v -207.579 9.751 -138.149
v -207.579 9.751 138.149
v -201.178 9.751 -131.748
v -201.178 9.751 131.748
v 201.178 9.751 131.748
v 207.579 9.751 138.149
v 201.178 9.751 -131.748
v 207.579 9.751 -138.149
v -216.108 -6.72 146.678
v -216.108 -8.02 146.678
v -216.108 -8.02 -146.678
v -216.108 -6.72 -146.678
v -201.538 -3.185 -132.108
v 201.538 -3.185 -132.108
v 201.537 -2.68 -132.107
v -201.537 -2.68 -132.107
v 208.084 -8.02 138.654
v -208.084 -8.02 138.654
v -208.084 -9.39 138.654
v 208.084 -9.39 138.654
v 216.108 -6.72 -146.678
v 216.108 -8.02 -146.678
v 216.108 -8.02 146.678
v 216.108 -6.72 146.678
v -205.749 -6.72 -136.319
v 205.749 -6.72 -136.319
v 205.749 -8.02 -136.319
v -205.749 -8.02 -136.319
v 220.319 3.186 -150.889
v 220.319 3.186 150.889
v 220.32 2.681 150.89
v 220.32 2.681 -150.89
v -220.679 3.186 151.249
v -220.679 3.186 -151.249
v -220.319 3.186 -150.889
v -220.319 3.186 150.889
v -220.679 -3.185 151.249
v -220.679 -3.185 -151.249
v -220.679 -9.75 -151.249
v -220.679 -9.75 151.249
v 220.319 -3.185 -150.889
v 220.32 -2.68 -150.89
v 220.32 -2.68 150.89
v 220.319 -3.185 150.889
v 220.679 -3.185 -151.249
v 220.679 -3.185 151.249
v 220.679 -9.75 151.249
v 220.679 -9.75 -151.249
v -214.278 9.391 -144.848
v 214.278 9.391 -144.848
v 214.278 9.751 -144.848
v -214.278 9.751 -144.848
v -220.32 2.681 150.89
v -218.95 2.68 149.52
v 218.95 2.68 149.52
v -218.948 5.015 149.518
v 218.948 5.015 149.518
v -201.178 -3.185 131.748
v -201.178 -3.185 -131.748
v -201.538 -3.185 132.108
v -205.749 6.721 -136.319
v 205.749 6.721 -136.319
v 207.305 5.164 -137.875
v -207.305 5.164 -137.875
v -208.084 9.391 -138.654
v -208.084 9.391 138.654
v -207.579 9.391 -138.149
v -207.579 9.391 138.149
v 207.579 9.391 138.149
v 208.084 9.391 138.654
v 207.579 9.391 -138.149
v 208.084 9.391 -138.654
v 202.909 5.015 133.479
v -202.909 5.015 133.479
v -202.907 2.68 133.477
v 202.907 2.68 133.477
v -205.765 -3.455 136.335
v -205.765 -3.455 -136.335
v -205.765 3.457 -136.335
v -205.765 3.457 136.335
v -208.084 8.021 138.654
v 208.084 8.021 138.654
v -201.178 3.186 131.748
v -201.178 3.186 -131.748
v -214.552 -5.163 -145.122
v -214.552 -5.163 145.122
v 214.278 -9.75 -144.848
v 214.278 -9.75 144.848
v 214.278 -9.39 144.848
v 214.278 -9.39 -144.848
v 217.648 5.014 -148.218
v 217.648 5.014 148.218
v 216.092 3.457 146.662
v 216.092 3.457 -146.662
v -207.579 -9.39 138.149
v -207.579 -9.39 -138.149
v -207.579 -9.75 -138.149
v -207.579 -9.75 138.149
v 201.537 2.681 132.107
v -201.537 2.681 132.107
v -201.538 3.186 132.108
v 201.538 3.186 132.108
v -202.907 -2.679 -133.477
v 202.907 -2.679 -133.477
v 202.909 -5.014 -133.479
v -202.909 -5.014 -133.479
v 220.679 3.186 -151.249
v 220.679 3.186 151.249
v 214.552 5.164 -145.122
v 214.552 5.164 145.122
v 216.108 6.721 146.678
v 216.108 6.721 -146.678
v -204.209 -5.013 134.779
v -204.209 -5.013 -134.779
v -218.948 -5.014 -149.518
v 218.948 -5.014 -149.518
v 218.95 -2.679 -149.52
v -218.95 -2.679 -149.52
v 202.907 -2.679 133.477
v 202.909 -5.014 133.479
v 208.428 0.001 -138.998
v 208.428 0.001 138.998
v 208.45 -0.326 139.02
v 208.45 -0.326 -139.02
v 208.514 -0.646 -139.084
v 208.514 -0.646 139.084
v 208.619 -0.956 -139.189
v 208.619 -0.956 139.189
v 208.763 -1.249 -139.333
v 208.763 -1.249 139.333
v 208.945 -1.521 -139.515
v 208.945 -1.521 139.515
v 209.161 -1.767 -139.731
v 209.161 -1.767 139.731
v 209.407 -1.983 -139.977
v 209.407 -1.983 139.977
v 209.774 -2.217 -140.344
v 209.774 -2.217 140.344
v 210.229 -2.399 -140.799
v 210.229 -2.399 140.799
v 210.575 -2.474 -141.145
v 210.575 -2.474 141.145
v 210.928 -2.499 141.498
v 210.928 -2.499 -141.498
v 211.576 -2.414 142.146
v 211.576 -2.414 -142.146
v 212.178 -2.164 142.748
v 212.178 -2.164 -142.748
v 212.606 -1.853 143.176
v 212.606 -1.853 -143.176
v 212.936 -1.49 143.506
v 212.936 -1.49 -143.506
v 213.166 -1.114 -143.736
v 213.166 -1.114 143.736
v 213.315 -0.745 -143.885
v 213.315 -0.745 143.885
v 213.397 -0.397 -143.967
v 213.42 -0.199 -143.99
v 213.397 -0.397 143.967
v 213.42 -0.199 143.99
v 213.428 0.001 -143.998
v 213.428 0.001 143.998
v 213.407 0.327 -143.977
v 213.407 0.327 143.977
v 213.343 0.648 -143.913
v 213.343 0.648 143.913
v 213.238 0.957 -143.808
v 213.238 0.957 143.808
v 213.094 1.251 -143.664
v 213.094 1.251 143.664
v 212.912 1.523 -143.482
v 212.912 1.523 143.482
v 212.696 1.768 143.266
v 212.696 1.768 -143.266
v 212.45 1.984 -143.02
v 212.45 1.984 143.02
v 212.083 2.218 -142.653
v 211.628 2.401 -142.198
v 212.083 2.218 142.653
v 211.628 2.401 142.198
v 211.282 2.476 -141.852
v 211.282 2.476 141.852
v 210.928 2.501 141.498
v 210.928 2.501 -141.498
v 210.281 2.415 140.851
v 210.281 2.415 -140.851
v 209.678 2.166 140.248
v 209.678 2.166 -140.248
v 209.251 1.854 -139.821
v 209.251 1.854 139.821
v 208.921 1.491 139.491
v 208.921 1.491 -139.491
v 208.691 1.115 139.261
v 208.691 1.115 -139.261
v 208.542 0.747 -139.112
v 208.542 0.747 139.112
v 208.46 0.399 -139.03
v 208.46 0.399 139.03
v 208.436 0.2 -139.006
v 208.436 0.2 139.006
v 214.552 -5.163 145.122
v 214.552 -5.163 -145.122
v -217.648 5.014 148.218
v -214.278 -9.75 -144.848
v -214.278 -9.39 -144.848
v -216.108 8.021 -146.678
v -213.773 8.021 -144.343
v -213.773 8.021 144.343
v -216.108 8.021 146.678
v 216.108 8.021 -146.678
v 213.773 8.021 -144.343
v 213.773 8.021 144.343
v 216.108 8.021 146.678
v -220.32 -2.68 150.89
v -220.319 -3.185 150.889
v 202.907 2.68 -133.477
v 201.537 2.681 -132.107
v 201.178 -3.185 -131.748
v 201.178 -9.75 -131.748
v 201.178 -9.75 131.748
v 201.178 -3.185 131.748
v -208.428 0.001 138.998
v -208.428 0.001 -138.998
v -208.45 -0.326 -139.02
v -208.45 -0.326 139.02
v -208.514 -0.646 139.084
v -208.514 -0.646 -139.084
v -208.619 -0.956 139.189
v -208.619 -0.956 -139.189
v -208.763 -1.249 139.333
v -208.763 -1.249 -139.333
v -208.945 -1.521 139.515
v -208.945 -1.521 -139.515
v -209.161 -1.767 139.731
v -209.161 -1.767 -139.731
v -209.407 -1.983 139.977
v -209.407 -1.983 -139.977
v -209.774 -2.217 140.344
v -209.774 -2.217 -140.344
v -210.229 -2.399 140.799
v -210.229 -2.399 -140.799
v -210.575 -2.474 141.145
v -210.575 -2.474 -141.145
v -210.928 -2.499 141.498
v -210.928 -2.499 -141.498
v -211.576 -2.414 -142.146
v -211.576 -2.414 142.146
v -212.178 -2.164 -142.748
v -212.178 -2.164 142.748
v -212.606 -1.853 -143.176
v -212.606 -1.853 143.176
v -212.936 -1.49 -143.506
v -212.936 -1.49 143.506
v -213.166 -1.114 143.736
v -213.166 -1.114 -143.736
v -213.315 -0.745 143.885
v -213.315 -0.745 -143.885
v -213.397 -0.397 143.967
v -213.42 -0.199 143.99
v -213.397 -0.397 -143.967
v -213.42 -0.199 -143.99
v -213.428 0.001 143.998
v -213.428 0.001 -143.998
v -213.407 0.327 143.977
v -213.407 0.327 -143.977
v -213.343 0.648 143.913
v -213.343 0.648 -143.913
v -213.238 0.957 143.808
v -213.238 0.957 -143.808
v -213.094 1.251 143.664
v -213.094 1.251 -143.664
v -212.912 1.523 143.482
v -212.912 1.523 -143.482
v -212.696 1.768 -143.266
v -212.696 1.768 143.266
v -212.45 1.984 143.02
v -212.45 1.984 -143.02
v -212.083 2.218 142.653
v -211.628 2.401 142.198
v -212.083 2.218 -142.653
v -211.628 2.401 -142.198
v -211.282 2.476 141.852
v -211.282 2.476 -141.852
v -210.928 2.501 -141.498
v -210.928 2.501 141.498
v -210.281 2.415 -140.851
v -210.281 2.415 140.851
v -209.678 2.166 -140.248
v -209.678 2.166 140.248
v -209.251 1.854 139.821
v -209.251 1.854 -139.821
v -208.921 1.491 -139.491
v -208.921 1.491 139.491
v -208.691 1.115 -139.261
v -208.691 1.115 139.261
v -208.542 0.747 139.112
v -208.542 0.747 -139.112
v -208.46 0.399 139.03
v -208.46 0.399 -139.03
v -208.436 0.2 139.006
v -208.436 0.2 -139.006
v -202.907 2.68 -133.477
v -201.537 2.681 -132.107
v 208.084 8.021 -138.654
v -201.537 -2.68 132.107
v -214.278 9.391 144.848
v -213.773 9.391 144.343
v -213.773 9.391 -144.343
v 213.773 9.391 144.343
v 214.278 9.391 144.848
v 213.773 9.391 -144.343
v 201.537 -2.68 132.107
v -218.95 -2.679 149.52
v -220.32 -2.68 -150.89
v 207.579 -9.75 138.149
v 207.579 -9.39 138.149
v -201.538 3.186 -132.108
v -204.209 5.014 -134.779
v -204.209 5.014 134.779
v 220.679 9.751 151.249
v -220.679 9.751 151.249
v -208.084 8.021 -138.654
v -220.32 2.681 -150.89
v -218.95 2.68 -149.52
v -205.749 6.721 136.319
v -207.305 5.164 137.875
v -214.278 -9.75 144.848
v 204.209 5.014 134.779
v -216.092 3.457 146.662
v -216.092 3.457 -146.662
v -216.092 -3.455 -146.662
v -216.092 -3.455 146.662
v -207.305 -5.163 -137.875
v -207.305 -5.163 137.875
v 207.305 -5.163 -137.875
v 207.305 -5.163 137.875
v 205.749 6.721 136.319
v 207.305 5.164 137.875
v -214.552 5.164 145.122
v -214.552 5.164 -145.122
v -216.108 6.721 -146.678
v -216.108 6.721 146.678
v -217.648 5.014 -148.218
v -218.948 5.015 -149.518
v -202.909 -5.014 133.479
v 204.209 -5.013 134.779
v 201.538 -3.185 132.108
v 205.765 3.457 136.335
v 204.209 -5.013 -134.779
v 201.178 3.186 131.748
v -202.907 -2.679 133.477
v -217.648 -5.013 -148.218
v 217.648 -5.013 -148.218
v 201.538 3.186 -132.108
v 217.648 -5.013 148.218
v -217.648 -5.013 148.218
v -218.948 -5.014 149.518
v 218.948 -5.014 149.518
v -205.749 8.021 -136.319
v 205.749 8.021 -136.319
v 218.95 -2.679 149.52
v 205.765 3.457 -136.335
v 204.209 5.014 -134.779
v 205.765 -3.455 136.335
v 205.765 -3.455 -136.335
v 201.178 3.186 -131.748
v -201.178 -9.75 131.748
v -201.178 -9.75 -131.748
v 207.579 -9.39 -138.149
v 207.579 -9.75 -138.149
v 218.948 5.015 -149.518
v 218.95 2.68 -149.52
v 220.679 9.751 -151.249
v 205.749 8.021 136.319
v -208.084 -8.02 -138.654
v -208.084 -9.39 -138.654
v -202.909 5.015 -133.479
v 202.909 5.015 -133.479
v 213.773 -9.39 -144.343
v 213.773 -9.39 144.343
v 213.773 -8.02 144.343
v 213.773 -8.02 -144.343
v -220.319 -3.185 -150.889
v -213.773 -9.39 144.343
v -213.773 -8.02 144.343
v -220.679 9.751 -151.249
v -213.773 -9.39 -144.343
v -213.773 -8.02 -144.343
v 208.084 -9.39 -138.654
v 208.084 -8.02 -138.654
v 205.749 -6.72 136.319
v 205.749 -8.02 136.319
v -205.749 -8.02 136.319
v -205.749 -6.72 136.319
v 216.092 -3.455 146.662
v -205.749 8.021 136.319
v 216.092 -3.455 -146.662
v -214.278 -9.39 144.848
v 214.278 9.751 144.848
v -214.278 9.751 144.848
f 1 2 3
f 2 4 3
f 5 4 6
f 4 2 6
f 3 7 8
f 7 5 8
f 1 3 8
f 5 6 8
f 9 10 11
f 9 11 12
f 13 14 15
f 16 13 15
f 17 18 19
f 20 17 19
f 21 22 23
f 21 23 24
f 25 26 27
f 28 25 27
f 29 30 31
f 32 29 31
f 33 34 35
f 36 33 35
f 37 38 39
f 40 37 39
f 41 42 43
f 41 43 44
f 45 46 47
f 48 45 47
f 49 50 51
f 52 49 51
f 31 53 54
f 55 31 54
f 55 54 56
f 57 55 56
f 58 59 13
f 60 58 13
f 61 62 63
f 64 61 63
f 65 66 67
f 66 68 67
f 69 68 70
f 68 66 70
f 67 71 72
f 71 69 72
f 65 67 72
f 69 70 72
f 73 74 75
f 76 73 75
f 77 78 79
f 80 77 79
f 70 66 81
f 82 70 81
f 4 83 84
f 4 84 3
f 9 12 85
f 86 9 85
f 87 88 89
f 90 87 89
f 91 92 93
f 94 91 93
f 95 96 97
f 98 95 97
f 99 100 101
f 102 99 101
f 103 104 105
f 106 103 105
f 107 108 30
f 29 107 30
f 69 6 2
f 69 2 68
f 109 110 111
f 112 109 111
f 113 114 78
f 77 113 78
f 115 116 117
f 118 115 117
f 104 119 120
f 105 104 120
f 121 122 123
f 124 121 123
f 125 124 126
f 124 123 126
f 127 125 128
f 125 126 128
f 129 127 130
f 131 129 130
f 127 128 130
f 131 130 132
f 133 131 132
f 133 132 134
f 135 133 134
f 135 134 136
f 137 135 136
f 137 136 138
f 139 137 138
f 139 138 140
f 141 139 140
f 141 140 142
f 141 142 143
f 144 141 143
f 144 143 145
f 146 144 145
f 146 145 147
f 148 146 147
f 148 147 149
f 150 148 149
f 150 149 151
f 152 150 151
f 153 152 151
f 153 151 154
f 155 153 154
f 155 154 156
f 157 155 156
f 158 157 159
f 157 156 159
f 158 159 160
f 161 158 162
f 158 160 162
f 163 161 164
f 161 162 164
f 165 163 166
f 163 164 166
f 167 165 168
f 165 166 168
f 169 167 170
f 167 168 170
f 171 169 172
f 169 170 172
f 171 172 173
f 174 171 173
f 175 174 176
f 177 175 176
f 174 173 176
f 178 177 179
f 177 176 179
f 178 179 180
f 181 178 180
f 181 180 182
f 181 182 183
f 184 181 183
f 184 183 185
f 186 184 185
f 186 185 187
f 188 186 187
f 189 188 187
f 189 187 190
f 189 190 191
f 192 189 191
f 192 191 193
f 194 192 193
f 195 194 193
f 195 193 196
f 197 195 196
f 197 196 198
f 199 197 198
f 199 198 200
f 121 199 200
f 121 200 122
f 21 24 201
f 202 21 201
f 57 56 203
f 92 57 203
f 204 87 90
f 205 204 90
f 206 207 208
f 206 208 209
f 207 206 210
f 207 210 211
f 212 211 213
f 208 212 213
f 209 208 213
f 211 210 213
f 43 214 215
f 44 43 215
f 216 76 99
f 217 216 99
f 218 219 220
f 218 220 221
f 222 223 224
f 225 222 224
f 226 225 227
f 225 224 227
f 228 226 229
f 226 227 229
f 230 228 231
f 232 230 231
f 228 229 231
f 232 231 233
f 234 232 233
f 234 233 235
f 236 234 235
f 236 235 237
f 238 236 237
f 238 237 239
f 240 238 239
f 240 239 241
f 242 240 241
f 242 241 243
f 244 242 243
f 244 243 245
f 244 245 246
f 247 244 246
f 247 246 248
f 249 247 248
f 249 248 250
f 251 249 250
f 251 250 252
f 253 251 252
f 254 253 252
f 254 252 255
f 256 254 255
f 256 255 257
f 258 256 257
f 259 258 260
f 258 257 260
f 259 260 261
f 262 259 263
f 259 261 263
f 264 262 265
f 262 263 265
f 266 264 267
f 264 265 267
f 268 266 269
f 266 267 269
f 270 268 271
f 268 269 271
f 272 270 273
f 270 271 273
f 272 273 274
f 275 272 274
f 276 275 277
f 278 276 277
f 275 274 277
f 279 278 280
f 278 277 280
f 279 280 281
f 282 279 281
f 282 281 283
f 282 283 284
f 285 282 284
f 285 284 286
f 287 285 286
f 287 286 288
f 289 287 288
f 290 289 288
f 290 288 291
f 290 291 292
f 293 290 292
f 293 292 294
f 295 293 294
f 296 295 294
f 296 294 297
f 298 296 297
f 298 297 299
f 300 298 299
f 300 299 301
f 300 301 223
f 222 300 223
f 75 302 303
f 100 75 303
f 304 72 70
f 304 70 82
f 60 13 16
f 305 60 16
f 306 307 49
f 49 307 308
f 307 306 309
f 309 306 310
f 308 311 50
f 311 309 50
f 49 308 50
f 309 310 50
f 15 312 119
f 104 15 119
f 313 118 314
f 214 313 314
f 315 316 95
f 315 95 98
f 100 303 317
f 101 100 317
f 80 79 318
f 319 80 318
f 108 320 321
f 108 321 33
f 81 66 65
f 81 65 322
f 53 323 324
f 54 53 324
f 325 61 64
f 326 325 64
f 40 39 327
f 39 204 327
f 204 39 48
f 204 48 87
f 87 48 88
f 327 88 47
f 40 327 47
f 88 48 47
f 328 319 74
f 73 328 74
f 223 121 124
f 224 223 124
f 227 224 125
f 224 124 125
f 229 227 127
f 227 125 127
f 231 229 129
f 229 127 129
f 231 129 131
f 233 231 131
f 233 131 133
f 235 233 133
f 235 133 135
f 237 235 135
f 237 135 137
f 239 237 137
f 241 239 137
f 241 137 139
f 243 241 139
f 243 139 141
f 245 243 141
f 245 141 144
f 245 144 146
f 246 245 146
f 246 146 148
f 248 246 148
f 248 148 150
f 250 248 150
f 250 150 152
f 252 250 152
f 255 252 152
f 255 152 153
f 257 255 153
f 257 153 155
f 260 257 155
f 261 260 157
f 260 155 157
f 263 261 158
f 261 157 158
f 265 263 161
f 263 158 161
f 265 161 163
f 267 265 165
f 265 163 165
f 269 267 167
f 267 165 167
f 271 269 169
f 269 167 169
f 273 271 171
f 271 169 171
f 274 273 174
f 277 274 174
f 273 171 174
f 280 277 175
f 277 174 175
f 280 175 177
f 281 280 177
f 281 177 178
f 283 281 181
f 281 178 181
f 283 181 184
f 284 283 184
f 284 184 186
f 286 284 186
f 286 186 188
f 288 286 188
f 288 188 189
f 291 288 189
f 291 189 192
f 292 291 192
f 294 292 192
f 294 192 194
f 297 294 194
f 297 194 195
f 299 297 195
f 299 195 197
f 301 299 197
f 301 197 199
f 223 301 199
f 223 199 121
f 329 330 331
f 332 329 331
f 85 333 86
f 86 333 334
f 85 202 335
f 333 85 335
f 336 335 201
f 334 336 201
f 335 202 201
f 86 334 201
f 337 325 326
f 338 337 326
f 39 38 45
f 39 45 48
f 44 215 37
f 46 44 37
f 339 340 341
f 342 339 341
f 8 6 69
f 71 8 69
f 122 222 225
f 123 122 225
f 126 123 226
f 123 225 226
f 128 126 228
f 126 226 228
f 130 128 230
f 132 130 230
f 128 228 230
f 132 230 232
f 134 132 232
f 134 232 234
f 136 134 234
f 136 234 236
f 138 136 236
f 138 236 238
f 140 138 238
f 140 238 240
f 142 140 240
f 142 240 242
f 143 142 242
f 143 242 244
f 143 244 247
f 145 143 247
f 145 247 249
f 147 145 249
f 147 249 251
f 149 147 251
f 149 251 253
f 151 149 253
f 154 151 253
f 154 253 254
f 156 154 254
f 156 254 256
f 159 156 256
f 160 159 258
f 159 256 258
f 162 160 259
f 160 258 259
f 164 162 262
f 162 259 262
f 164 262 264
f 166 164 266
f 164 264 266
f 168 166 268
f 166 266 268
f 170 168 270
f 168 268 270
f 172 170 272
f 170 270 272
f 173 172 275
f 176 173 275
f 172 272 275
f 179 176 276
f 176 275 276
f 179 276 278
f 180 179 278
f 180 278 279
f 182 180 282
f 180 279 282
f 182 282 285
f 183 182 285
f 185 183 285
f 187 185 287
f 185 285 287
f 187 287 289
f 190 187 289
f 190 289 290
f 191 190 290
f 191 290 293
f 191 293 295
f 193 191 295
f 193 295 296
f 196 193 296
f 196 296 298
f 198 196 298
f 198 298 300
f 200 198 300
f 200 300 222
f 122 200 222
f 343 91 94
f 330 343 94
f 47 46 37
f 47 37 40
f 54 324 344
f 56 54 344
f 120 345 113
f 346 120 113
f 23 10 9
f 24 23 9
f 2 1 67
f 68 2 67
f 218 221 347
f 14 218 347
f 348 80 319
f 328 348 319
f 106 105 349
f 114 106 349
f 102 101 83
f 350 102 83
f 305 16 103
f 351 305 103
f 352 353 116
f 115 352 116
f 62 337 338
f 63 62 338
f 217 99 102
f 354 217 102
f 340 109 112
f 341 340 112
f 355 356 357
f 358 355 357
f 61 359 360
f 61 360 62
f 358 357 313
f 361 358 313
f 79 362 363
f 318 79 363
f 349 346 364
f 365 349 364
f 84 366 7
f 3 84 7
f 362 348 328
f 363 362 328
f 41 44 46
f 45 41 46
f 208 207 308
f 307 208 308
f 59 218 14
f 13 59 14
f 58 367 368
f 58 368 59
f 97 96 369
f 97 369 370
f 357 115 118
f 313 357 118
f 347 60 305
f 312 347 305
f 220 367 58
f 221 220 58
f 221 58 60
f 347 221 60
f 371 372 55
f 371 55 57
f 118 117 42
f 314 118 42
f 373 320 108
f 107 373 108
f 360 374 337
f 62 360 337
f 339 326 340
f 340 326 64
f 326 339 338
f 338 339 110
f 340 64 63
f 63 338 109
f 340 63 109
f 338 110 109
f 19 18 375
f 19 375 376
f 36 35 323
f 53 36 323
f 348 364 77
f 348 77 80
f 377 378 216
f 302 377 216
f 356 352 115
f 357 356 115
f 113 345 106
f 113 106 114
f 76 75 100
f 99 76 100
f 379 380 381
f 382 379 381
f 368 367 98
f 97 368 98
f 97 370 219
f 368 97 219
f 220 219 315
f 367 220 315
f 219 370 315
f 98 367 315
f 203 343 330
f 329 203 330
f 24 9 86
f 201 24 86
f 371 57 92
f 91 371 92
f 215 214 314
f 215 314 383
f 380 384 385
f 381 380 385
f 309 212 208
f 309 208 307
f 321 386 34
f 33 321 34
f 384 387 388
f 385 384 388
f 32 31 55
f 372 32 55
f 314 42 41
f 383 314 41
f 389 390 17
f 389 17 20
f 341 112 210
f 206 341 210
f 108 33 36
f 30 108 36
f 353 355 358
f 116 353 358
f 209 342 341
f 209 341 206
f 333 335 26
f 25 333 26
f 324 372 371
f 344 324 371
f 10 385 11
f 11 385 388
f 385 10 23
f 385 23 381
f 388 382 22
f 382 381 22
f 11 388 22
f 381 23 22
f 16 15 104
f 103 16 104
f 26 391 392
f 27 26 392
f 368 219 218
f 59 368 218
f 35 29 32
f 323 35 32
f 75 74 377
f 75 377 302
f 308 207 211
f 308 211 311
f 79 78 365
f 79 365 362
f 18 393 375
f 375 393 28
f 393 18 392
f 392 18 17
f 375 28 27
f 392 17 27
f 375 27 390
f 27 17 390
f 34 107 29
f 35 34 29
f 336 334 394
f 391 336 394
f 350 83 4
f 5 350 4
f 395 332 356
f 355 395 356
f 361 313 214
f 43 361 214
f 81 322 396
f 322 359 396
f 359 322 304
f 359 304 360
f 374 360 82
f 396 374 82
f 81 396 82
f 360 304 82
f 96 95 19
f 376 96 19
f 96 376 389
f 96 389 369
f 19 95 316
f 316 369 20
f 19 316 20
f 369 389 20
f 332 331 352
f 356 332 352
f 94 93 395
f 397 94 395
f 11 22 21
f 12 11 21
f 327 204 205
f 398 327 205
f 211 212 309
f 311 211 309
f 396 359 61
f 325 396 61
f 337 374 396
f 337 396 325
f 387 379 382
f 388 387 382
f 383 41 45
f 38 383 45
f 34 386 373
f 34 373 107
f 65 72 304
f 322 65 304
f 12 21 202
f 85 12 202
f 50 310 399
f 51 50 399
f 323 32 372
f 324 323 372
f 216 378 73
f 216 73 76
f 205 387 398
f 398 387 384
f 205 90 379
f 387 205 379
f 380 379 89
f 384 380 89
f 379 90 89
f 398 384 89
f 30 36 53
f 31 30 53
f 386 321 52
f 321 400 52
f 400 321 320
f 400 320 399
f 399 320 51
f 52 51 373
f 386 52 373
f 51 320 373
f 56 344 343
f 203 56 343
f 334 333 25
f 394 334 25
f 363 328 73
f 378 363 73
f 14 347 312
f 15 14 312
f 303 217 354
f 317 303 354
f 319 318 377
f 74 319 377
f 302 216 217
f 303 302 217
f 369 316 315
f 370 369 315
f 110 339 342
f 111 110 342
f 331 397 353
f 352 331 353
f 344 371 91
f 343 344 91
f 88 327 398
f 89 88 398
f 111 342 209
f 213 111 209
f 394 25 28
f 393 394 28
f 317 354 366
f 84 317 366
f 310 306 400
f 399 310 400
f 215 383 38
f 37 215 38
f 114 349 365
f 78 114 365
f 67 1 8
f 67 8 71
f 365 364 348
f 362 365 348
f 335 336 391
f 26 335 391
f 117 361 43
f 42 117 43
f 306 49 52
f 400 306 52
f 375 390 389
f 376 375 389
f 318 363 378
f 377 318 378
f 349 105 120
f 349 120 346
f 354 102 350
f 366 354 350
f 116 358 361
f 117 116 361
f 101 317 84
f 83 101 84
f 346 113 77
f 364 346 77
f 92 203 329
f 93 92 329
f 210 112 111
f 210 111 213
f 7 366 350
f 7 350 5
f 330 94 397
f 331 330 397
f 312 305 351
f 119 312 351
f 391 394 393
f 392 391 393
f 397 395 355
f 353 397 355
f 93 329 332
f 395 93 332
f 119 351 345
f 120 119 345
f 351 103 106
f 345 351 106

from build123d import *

# Parameters (mm, degrees)
CROQUIS2_R = 2.5


with BuildPart() as part:
    # Barrer1: sweep along a path in Croquis1
    with BuildLine(Plane(origin=(0, 0, 0), x_dir=(1, 0, 0), z_dir=(0, 1, 0))) as barrer1_path:
        Line((-210.93, 141.5), (210.93, 141.5))
        Line((210.93, 141.5), (210.93, -141.5))
        Line((210.93, -141.5), (-210.93, -141.5))
        Line((-210.93, -141.5), (-210.93, 141.5))
    # Croquis2 → Barrer1 (sweep)
    with BuildSketch(Plane(origin=(0, 0, 0), x_dir=(0, 0, -1), z_dir=(1, 0, 0))):
        Polygon((-144.848190044, 9.751218458), (-144.848190044, 9.391218458), (-144.343190044, 9.391218458), (-144.343190044, 8.021218458), (-146.678190044, 8.021218458), (-146.678190044, 6.721218458), (-145.121709911, 5.163799744), (-137.875239336, 5.163799744), (-136.318759202, 6.721218458), (-136.318759202, 8.021218458), (-138.653759202, 8.021218458), (-138.653759202, 9.391218458), (-138.148759202, 9.391218458), (-138.148759202, 9.751218458), (-131.747639801, 9.751218458), (-131.747639801, 3.185976388), (-132.107639736, 3.185759368), (-132.107335305, 2.68075946), (-133.477335056, 2.679933578), (-133.478742672, 5.014933154), (-134.778742435, 5.01414947), (-136.335222569, 3.456730756), (-136.335222569, -3.455477102), (-134.778742435, -5.012895817), (-133.478742672, -5.0136795), (-133.477335056, -2.678679924), (-132.107335305, -2.679505806), (-132.107639736, -3.184505714), (-131.747639801, -3.184722734), (-131.747639801, -9.749964804), (-138.148759202, -9.749964804), (-138.148759202, -9.389964804), (-138.653759202, -9.389964804), (-138.653759202, -8.019964804), (-136.318759202, -8.019964804), (-136.318759202, -6.719964804), (-137.875239336, -5.16254609), (-145.121709911, -5.16254609), (-146.678190044, -6.719964804), (-146.678190044, -8.019964804), (-144.343190044, -8.019964804), (-144.343190044, -9.389964804), (-144.848190044, -9.389964804), (-144.848190044, -9.749964804), (-151.249309446, -9.749964804), (-151.249309446, -3.184722734), (-150.889309511, -3.184505714), (-150.889613942, -2.679505806), (-149.519614191, -2.678679924), (-149.518206575, -5.0136795), (-148.218206811, -5.012895817), (-146.661726678, -3.455477102), (-146.661726678, 3.456730756), (-148.218206811, 5.01414947), (-149.518206575, 5.014933154), (-149.519614191, 2.679933578), (-150.889613942, 2.68075946), (-150.889309511, 3.185759368), (-151.249309446, 3.185976388), (-151.249309446, 9.751218458), align=None)
        with Locations((-141.498474623, 0.000626827)):
            Circle(CROQUIS2_R, mode=Mode.SUBTRACT)
    sweep(path=barrer1_path.line, transition=Transition.RIGHT)


solid = part.part
